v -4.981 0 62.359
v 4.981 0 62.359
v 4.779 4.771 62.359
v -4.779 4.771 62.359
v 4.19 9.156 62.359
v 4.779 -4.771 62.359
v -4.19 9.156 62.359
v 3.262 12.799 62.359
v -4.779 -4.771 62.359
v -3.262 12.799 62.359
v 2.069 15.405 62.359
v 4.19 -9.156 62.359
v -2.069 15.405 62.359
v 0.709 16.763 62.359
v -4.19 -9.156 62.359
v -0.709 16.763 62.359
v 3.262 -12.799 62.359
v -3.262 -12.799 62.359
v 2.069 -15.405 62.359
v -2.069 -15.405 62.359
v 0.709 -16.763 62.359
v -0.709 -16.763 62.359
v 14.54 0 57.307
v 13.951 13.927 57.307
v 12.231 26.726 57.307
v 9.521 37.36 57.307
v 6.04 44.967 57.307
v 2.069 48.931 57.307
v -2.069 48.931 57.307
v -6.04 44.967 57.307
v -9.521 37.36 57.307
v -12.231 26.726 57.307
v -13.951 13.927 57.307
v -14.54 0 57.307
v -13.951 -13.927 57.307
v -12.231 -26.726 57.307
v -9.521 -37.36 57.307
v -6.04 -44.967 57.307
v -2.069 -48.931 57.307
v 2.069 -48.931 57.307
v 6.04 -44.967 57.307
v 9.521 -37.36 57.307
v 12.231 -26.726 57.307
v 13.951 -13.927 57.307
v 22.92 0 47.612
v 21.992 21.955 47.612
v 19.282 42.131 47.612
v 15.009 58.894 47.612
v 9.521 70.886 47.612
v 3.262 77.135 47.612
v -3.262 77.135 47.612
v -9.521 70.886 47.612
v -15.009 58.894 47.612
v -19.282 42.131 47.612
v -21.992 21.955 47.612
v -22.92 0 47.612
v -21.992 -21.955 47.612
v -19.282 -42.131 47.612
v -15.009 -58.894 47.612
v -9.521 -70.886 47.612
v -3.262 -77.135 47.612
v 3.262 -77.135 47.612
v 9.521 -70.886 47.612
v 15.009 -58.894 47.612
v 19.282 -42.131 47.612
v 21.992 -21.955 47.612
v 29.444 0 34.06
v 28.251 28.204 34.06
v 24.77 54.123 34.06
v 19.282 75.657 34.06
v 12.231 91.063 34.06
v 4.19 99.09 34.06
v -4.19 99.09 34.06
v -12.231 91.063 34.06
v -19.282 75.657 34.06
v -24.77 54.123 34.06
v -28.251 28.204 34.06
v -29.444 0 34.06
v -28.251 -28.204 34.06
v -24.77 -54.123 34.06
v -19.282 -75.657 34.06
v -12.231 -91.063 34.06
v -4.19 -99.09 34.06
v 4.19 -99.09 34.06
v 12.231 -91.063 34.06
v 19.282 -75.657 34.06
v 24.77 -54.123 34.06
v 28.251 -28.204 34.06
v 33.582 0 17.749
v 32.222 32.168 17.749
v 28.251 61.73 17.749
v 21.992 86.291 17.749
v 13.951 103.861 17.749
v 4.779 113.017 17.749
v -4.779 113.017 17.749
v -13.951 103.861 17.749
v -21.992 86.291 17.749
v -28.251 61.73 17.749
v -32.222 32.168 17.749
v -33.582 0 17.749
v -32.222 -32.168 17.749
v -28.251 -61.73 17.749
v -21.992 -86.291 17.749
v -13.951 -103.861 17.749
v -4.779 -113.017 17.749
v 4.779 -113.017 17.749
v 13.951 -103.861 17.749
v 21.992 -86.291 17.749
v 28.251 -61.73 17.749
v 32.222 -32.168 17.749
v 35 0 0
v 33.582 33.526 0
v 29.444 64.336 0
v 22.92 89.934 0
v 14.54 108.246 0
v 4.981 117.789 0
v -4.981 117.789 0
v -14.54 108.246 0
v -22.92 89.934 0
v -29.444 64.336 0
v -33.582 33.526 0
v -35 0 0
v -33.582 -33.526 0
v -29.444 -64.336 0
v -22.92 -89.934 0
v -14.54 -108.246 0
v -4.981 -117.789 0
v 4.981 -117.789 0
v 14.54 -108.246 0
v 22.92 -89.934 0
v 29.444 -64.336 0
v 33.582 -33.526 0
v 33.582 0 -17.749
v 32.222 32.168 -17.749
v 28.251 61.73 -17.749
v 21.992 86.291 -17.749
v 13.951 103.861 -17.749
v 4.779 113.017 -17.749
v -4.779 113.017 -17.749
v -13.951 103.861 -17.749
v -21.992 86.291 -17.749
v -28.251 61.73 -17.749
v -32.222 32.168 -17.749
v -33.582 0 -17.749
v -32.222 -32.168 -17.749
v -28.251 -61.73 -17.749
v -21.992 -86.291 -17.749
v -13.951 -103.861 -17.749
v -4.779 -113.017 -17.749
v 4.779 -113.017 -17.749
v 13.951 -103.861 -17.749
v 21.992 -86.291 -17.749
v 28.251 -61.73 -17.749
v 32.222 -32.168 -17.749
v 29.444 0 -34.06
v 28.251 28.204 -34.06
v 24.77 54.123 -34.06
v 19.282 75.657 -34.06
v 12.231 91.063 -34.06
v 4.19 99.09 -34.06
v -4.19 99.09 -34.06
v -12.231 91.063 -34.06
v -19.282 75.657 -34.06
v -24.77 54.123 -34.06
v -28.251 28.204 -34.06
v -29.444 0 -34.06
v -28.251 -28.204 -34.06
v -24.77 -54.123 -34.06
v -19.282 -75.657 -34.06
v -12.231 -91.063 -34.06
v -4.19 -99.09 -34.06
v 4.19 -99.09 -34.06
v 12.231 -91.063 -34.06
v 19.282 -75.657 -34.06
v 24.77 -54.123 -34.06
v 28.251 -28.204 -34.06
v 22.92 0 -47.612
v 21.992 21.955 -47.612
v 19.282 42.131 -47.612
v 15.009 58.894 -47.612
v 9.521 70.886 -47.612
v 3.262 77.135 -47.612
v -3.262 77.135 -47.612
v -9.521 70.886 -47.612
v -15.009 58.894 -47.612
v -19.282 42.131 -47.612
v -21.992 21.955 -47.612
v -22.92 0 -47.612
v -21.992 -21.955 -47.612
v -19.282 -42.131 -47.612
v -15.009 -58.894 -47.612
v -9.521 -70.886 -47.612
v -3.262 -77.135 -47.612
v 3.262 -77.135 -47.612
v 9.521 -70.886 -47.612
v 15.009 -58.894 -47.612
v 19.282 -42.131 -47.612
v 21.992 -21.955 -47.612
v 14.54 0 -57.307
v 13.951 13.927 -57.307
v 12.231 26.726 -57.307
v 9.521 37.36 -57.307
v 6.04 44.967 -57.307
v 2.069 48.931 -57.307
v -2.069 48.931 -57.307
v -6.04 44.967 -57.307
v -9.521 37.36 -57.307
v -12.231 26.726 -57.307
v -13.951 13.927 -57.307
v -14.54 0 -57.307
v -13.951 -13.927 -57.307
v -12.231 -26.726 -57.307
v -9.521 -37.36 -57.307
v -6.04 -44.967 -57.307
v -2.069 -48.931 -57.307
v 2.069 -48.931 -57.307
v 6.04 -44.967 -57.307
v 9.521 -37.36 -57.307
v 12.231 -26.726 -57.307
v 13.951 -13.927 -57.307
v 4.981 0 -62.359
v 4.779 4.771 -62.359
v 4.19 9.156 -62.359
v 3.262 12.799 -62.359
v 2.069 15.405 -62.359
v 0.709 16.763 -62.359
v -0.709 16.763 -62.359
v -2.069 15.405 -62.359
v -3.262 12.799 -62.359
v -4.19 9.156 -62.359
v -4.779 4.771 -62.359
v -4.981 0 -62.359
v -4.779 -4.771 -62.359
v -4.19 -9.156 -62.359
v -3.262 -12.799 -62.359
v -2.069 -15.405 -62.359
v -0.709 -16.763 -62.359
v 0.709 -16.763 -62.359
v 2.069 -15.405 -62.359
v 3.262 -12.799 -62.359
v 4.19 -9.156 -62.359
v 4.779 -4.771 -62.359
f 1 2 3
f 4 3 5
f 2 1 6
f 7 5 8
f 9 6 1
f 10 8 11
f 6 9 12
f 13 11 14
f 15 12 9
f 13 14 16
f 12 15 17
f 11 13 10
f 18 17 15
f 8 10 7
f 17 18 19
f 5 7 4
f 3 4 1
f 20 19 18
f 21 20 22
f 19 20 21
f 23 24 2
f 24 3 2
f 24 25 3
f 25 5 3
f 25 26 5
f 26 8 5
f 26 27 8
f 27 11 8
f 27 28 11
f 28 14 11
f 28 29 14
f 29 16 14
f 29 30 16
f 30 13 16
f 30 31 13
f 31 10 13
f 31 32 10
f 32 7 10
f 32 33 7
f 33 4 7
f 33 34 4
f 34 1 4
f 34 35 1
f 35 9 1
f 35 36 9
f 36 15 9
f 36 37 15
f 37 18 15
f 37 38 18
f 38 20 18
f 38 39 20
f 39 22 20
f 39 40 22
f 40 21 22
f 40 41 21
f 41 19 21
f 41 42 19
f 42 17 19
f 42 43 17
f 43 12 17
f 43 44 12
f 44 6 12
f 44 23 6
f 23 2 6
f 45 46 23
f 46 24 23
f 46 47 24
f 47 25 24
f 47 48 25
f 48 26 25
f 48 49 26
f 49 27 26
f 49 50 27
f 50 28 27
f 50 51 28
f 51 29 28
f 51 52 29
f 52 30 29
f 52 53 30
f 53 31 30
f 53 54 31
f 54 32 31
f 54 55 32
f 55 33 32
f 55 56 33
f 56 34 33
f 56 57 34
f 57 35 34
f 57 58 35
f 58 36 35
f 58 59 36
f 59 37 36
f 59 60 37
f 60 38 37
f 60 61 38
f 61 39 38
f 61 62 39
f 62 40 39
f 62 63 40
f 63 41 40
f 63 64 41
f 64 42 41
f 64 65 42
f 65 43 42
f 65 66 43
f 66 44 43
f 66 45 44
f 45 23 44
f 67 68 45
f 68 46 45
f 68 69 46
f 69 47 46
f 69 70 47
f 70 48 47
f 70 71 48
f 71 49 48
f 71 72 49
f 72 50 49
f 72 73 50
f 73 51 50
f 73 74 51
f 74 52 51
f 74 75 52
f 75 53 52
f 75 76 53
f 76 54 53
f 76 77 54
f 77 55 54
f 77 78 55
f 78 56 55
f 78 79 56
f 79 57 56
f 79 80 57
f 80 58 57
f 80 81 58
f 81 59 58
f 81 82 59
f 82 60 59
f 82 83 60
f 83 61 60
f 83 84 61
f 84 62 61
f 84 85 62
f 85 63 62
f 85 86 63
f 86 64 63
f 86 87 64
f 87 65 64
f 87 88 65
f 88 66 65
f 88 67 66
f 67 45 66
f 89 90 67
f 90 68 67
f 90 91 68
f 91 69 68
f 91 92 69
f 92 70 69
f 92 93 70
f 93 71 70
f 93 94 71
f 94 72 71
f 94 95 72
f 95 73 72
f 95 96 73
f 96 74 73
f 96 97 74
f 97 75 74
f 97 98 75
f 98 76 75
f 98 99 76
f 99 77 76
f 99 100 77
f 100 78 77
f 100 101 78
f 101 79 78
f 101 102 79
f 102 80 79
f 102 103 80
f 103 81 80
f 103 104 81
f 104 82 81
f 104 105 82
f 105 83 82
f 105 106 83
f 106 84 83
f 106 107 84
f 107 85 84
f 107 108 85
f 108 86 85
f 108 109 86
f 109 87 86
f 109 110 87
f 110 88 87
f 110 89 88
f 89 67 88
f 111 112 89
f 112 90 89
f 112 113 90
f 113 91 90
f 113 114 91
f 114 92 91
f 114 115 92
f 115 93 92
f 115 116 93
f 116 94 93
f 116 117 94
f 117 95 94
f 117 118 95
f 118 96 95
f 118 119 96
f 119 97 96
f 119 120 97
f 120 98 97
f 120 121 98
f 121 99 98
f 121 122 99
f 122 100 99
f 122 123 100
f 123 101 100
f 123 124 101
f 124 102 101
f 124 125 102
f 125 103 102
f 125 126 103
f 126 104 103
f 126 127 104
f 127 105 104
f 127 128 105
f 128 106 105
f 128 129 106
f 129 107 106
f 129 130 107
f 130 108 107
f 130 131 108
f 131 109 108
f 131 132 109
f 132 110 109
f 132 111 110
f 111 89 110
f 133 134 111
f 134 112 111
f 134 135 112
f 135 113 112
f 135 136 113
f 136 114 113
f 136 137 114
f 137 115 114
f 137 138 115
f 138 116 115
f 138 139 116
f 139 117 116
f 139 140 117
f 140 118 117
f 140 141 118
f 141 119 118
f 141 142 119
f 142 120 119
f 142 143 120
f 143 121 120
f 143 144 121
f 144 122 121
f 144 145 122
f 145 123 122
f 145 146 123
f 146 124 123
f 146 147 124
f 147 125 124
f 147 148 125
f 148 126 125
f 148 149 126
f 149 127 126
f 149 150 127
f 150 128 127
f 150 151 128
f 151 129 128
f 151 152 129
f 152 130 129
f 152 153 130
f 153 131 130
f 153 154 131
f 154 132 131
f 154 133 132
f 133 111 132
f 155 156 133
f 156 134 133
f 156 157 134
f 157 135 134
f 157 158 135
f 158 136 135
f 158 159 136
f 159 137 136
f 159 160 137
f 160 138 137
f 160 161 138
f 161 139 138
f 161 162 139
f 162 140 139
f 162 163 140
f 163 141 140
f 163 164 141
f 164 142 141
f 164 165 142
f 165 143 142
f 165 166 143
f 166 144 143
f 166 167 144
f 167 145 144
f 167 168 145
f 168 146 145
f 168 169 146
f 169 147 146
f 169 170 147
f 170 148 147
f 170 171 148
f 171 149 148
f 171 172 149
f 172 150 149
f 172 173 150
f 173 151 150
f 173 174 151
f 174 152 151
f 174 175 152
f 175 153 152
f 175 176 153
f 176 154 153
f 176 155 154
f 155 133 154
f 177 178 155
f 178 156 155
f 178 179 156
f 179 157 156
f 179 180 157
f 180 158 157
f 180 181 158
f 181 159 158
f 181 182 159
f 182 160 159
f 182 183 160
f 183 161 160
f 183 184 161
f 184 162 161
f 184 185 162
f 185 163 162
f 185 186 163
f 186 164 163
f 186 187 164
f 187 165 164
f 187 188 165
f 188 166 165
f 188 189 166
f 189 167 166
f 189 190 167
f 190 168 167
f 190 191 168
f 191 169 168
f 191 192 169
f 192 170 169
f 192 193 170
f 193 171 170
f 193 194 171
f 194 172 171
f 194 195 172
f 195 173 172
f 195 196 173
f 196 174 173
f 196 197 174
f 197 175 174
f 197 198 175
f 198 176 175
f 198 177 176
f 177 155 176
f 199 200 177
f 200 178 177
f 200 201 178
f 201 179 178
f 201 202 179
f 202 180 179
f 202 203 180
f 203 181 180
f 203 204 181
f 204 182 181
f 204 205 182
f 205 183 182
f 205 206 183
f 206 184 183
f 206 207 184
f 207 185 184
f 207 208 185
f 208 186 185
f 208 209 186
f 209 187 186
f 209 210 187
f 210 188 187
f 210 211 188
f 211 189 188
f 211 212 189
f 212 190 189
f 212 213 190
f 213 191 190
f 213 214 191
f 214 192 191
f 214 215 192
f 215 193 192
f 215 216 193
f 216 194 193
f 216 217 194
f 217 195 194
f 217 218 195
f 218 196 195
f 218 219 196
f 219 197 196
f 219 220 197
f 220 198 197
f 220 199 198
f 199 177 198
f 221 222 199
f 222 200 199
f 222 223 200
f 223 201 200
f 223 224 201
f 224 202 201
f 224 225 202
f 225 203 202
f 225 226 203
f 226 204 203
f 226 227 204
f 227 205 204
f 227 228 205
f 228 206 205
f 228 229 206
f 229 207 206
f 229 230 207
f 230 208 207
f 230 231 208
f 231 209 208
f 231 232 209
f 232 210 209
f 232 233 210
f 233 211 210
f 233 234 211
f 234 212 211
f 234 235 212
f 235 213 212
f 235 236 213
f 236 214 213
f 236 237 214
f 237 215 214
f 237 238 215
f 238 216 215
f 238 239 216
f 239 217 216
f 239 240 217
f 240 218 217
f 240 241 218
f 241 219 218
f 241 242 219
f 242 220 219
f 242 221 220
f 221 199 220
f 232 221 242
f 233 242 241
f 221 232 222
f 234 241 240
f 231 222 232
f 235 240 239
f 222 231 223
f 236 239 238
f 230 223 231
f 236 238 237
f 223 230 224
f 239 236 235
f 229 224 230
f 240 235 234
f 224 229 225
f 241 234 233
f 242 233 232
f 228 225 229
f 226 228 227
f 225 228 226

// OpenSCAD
// Generated by SolidPython 1.0.1 on 2020-07-29 00:46:46


scale(v = [5, 17, 9]) {
	sphere(r = 7);
}
/***********************************************
*********      SolidPython code:      **********
************************************************
 
# import packages: SolidPython
from solid import *
from solid.utils import *
from itertools import chain, combinations, permutations


class Resize:

    def __init__(self, scad_file):
        self.scad_file = scad_file
        #self.scad_file = import_scad(scad_file)
        # cone/cylinder param:
        self.r1 = 0
        self.r2 = 0
        self.h = 0
        # rectangular prism param:
        self.w = 0
        self.l = 0
        # ellipse param:
        self.r = 0

    # import OpenScad code (file name corresponds to shape)


    # classify shape + parameters
    def assign(self, param1, param2, param3):
        if self.scad_file == 'cone.scad':
            self.r1 = param1
            self.r2 = param2
            self.h = param3
        elif self.scad_file == 'cylinder.scad':
            self.r1 = param1
            self.r2 = param2
            self.h = param3
        elif self.scad_file == 'rectangularPrism.scad':
            self.h = param1
            self.l = param2
            self.w = param3
        else:
            self.r = param1
            self.h = param2

    # resize parameters
    def iterate(self):
        x = range(3, 20, 2)
        i = 1
        if self.scad_file == 'cone.scad':
            tempList = list(permutations(x, 2))
            for temp in tempList:
                param1 = temp[0]
                param2 = temp[1]
                filepath = 'produced_scad_files/' + 'cone' + str(param1) + '_' + str(param2) + '_' + '.scad'
                scad_render_to_file(cylinder(h=param1, r1=param2, r2=0), filepath)

        elif self.scad_file == 'cylinder.scad':
            tempList = list(permutations(x, 3))
            for temp in tempList:
                param1 = temp[0]
                param2 = temp[1]
                filepath = 'produced_scad_files/' + 'cylinder' + str(param1) + '_' + str(param2) + '_' + '.scad'
                scad_render_to_file(cylinder(h=param1, r1=param2, r2=param2), filepath)

        elif self.scad_file == 'rectangularPrism.scad':
            tempList = list(permutations(x, 3))
            for temp in tempList:
                param1 = temp[0]
                param2 = temp[1]
                param3 = temp[2]
                filepath = 'produced_scad_files/' + 'rectangularPrism' + str(param1) + '_' + str(param2) + '_' + str(
                    param3) + '.scad'
                scad_render_to_file(cube(size=(param1, param2, param3)), filepath)

        elif self.scad_file == 'ellipse.scad':
            tempList = list(permutations(x, 4))
            for temp in tempList:
                param1 = temp[0]
                param2 = temp[1]
                param3 = temp[2]
                param4 = temp[3]
                filepath = 'produced_scad_files/' + 'ellipse' + str(param1) + '_' + str(param2) + '_' + str(param3) + '_' + str(param4) + '.scad'
                scad_render_to_file(scale([param1, param2, param3])(sphere(r=param4)), filepath)

    def render_to_scadfile(self):
        scad_render_to_file(scad, 'example.scad') 
 
************************************************/
